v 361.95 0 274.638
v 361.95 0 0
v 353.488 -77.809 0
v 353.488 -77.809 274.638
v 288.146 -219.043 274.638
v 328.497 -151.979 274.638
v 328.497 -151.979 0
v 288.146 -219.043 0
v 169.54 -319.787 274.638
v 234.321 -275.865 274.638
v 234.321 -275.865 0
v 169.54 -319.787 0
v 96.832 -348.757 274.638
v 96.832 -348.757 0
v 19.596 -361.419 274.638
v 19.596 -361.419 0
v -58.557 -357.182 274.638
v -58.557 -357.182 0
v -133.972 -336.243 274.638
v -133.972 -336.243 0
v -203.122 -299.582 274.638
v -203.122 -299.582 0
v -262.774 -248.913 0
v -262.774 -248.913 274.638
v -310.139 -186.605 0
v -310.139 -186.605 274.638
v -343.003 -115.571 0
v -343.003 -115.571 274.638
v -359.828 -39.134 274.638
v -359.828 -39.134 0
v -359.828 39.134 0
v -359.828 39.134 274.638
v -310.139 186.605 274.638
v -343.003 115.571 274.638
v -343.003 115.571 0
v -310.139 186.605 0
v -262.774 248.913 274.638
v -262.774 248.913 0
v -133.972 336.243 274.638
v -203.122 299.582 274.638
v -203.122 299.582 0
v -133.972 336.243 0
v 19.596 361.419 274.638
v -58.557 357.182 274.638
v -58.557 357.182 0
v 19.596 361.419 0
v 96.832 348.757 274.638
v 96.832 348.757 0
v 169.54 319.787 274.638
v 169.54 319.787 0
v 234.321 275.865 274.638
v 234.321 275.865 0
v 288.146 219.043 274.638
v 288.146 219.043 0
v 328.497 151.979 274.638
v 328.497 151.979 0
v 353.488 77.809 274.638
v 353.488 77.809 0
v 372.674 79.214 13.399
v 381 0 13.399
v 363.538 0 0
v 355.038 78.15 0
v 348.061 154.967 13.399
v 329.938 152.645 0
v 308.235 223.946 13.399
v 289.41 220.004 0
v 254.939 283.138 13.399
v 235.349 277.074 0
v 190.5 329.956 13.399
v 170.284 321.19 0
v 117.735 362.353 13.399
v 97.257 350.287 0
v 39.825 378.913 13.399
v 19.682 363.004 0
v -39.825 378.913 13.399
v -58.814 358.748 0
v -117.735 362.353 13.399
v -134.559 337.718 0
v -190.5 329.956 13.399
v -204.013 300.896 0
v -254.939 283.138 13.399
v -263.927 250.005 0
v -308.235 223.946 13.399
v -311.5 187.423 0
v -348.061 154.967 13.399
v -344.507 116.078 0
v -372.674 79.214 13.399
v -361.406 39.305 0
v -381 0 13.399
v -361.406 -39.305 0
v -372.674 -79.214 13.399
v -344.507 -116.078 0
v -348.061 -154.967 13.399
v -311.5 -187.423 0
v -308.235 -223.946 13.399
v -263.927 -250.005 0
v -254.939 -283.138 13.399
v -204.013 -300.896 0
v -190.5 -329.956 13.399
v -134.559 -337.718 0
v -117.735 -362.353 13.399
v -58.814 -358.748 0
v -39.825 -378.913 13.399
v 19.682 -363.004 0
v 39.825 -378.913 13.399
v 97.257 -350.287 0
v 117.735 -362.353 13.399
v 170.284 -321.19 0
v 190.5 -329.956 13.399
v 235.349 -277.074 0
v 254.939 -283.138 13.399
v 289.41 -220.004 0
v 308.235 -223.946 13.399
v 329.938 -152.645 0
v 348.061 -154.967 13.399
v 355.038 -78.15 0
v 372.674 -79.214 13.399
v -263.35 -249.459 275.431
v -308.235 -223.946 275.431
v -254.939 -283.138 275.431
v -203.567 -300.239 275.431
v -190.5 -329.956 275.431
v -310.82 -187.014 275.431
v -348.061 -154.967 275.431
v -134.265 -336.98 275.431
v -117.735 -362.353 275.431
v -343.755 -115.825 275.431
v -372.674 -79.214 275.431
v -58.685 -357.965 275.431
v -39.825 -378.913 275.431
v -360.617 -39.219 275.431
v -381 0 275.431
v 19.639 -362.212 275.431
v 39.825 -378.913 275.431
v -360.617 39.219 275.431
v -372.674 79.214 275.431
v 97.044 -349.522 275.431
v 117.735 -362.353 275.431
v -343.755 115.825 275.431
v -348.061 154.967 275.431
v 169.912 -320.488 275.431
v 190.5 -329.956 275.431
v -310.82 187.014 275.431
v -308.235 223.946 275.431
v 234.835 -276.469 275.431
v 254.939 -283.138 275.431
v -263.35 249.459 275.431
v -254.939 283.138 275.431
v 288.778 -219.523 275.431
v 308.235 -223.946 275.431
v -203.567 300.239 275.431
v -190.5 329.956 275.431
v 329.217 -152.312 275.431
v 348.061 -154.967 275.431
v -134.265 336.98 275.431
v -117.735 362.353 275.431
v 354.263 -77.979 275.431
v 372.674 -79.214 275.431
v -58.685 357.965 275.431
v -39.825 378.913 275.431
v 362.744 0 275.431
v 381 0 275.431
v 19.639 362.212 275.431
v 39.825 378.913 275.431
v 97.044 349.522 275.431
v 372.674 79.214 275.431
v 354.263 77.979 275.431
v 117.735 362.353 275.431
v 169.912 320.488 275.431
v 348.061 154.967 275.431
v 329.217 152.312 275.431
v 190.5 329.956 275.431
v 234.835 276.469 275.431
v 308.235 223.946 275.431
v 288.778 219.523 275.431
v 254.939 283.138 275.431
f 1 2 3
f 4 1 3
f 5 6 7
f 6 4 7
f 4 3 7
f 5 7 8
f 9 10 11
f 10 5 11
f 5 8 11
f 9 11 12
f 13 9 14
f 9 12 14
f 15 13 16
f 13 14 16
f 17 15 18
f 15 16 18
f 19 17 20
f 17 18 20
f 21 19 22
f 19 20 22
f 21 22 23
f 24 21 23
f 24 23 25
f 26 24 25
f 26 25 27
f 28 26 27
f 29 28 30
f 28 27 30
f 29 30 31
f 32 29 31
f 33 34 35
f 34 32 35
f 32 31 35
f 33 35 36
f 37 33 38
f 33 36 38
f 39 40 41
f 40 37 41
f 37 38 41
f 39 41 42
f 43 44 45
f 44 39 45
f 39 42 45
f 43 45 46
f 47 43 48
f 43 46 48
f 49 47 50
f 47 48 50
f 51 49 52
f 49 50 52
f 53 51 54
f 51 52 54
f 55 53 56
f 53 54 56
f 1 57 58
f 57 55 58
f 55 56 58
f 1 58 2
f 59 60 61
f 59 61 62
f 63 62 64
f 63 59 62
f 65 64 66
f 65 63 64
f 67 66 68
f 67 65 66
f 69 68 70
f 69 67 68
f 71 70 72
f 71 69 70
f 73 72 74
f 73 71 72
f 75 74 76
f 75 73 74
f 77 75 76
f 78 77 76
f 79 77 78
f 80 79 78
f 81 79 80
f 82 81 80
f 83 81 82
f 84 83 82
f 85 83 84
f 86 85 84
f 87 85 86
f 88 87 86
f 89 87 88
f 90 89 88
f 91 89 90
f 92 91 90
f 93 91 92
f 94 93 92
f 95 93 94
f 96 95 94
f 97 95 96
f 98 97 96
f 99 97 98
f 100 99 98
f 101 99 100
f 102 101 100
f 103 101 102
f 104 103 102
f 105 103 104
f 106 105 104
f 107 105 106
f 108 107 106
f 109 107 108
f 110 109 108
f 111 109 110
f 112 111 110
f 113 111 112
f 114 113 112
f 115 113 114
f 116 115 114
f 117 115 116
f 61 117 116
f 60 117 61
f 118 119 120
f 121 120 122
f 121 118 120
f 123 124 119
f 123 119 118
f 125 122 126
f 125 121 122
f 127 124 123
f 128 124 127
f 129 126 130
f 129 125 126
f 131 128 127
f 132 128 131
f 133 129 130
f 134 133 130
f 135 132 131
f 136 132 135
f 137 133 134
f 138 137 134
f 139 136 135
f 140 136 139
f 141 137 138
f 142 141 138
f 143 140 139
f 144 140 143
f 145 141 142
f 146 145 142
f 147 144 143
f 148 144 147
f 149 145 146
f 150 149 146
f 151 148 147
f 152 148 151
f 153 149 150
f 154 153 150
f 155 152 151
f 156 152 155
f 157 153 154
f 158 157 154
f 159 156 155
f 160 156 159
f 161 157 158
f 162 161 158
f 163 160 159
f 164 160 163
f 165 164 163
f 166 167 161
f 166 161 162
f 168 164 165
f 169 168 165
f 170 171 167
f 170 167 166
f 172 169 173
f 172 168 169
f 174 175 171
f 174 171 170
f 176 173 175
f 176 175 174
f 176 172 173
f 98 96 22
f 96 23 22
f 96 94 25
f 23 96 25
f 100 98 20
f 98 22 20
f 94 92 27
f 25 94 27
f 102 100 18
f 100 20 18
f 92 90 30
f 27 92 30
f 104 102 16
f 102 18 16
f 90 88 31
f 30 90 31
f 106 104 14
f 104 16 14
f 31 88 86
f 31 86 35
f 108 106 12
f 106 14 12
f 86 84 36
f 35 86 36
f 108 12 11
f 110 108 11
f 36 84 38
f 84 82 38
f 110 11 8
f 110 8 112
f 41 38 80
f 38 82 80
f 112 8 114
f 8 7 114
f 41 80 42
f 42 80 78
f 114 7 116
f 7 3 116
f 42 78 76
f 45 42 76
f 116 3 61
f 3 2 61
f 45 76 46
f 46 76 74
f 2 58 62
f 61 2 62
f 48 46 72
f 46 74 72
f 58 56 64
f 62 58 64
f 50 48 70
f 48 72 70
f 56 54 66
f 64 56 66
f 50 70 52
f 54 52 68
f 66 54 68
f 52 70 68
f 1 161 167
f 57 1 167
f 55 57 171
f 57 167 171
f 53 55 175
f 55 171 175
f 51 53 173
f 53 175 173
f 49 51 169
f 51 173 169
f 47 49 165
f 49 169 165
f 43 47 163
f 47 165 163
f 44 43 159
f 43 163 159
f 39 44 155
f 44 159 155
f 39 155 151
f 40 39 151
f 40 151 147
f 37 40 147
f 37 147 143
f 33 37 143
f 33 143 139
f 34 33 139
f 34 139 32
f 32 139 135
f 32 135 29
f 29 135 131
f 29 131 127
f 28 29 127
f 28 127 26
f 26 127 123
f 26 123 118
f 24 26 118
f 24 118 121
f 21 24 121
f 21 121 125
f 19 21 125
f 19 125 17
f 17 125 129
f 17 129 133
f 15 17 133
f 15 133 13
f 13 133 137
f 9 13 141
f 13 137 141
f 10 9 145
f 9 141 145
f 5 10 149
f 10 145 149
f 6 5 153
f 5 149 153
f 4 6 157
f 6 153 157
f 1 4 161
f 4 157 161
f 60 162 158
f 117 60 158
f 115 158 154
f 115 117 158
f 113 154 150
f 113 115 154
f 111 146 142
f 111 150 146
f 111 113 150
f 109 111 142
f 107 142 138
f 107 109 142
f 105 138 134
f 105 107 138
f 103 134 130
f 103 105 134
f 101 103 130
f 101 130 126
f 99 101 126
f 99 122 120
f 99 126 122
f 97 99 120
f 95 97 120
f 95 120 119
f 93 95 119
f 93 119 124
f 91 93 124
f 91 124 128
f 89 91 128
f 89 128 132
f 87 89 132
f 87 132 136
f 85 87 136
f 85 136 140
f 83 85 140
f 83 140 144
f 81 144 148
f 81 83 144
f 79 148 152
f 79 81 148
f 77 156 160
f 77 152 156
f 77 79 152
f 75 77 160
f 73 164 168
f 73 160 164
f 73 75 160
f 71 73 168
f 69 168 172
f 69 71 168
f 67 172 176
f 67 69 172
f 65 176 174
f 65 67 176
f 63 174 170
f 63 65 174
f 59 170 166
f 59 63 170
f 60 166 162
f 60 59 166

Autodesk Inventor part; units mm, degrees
ref_plane "YZ Plane" through (0, 0, 0) normal (1, 0, 0) x (0, 1, 0)
ref_plane "XZ Plane" through (0, 0, 0) normal (0, 1, 0) x (-1, 0, 0)
sketch "Sketch1" plane through (0, 0, 0) normal (0, 0, 1) x (1, 0, 0)
  circle A0 centre (0, 0) radius 381
  circle A1 centre (0, 0) radius 361.95
  dimension "d0" = 762
  dimension "d1" = 723.9
extrude "Extrusion1" add sketch "Sketch1" along normal blind 275.4312
chamfer "Chamfer1" distance 17.4625 angle 37.5 1 edges at (-381, 0, 0) measured on face at (-374.402, -4.4582, 0)
ref_plane "Work Plane2" through (0, 0, 243.6812) normal (0, 0, 1) x (1, 0, 0)
ref_plane "Work Plane1" through (0, 0, 224.6312) normal (0, 0, 1) x (1, 0, 0)
split_face "Split1"
split_face "Split2"
chamfer "Chamfer2" distance 0.7937 angle 45 1 edges at (-361.95, 0, 275.4312)
properties part number "A1-19037-300-03 30in pipe" material "Steel, Mild"
